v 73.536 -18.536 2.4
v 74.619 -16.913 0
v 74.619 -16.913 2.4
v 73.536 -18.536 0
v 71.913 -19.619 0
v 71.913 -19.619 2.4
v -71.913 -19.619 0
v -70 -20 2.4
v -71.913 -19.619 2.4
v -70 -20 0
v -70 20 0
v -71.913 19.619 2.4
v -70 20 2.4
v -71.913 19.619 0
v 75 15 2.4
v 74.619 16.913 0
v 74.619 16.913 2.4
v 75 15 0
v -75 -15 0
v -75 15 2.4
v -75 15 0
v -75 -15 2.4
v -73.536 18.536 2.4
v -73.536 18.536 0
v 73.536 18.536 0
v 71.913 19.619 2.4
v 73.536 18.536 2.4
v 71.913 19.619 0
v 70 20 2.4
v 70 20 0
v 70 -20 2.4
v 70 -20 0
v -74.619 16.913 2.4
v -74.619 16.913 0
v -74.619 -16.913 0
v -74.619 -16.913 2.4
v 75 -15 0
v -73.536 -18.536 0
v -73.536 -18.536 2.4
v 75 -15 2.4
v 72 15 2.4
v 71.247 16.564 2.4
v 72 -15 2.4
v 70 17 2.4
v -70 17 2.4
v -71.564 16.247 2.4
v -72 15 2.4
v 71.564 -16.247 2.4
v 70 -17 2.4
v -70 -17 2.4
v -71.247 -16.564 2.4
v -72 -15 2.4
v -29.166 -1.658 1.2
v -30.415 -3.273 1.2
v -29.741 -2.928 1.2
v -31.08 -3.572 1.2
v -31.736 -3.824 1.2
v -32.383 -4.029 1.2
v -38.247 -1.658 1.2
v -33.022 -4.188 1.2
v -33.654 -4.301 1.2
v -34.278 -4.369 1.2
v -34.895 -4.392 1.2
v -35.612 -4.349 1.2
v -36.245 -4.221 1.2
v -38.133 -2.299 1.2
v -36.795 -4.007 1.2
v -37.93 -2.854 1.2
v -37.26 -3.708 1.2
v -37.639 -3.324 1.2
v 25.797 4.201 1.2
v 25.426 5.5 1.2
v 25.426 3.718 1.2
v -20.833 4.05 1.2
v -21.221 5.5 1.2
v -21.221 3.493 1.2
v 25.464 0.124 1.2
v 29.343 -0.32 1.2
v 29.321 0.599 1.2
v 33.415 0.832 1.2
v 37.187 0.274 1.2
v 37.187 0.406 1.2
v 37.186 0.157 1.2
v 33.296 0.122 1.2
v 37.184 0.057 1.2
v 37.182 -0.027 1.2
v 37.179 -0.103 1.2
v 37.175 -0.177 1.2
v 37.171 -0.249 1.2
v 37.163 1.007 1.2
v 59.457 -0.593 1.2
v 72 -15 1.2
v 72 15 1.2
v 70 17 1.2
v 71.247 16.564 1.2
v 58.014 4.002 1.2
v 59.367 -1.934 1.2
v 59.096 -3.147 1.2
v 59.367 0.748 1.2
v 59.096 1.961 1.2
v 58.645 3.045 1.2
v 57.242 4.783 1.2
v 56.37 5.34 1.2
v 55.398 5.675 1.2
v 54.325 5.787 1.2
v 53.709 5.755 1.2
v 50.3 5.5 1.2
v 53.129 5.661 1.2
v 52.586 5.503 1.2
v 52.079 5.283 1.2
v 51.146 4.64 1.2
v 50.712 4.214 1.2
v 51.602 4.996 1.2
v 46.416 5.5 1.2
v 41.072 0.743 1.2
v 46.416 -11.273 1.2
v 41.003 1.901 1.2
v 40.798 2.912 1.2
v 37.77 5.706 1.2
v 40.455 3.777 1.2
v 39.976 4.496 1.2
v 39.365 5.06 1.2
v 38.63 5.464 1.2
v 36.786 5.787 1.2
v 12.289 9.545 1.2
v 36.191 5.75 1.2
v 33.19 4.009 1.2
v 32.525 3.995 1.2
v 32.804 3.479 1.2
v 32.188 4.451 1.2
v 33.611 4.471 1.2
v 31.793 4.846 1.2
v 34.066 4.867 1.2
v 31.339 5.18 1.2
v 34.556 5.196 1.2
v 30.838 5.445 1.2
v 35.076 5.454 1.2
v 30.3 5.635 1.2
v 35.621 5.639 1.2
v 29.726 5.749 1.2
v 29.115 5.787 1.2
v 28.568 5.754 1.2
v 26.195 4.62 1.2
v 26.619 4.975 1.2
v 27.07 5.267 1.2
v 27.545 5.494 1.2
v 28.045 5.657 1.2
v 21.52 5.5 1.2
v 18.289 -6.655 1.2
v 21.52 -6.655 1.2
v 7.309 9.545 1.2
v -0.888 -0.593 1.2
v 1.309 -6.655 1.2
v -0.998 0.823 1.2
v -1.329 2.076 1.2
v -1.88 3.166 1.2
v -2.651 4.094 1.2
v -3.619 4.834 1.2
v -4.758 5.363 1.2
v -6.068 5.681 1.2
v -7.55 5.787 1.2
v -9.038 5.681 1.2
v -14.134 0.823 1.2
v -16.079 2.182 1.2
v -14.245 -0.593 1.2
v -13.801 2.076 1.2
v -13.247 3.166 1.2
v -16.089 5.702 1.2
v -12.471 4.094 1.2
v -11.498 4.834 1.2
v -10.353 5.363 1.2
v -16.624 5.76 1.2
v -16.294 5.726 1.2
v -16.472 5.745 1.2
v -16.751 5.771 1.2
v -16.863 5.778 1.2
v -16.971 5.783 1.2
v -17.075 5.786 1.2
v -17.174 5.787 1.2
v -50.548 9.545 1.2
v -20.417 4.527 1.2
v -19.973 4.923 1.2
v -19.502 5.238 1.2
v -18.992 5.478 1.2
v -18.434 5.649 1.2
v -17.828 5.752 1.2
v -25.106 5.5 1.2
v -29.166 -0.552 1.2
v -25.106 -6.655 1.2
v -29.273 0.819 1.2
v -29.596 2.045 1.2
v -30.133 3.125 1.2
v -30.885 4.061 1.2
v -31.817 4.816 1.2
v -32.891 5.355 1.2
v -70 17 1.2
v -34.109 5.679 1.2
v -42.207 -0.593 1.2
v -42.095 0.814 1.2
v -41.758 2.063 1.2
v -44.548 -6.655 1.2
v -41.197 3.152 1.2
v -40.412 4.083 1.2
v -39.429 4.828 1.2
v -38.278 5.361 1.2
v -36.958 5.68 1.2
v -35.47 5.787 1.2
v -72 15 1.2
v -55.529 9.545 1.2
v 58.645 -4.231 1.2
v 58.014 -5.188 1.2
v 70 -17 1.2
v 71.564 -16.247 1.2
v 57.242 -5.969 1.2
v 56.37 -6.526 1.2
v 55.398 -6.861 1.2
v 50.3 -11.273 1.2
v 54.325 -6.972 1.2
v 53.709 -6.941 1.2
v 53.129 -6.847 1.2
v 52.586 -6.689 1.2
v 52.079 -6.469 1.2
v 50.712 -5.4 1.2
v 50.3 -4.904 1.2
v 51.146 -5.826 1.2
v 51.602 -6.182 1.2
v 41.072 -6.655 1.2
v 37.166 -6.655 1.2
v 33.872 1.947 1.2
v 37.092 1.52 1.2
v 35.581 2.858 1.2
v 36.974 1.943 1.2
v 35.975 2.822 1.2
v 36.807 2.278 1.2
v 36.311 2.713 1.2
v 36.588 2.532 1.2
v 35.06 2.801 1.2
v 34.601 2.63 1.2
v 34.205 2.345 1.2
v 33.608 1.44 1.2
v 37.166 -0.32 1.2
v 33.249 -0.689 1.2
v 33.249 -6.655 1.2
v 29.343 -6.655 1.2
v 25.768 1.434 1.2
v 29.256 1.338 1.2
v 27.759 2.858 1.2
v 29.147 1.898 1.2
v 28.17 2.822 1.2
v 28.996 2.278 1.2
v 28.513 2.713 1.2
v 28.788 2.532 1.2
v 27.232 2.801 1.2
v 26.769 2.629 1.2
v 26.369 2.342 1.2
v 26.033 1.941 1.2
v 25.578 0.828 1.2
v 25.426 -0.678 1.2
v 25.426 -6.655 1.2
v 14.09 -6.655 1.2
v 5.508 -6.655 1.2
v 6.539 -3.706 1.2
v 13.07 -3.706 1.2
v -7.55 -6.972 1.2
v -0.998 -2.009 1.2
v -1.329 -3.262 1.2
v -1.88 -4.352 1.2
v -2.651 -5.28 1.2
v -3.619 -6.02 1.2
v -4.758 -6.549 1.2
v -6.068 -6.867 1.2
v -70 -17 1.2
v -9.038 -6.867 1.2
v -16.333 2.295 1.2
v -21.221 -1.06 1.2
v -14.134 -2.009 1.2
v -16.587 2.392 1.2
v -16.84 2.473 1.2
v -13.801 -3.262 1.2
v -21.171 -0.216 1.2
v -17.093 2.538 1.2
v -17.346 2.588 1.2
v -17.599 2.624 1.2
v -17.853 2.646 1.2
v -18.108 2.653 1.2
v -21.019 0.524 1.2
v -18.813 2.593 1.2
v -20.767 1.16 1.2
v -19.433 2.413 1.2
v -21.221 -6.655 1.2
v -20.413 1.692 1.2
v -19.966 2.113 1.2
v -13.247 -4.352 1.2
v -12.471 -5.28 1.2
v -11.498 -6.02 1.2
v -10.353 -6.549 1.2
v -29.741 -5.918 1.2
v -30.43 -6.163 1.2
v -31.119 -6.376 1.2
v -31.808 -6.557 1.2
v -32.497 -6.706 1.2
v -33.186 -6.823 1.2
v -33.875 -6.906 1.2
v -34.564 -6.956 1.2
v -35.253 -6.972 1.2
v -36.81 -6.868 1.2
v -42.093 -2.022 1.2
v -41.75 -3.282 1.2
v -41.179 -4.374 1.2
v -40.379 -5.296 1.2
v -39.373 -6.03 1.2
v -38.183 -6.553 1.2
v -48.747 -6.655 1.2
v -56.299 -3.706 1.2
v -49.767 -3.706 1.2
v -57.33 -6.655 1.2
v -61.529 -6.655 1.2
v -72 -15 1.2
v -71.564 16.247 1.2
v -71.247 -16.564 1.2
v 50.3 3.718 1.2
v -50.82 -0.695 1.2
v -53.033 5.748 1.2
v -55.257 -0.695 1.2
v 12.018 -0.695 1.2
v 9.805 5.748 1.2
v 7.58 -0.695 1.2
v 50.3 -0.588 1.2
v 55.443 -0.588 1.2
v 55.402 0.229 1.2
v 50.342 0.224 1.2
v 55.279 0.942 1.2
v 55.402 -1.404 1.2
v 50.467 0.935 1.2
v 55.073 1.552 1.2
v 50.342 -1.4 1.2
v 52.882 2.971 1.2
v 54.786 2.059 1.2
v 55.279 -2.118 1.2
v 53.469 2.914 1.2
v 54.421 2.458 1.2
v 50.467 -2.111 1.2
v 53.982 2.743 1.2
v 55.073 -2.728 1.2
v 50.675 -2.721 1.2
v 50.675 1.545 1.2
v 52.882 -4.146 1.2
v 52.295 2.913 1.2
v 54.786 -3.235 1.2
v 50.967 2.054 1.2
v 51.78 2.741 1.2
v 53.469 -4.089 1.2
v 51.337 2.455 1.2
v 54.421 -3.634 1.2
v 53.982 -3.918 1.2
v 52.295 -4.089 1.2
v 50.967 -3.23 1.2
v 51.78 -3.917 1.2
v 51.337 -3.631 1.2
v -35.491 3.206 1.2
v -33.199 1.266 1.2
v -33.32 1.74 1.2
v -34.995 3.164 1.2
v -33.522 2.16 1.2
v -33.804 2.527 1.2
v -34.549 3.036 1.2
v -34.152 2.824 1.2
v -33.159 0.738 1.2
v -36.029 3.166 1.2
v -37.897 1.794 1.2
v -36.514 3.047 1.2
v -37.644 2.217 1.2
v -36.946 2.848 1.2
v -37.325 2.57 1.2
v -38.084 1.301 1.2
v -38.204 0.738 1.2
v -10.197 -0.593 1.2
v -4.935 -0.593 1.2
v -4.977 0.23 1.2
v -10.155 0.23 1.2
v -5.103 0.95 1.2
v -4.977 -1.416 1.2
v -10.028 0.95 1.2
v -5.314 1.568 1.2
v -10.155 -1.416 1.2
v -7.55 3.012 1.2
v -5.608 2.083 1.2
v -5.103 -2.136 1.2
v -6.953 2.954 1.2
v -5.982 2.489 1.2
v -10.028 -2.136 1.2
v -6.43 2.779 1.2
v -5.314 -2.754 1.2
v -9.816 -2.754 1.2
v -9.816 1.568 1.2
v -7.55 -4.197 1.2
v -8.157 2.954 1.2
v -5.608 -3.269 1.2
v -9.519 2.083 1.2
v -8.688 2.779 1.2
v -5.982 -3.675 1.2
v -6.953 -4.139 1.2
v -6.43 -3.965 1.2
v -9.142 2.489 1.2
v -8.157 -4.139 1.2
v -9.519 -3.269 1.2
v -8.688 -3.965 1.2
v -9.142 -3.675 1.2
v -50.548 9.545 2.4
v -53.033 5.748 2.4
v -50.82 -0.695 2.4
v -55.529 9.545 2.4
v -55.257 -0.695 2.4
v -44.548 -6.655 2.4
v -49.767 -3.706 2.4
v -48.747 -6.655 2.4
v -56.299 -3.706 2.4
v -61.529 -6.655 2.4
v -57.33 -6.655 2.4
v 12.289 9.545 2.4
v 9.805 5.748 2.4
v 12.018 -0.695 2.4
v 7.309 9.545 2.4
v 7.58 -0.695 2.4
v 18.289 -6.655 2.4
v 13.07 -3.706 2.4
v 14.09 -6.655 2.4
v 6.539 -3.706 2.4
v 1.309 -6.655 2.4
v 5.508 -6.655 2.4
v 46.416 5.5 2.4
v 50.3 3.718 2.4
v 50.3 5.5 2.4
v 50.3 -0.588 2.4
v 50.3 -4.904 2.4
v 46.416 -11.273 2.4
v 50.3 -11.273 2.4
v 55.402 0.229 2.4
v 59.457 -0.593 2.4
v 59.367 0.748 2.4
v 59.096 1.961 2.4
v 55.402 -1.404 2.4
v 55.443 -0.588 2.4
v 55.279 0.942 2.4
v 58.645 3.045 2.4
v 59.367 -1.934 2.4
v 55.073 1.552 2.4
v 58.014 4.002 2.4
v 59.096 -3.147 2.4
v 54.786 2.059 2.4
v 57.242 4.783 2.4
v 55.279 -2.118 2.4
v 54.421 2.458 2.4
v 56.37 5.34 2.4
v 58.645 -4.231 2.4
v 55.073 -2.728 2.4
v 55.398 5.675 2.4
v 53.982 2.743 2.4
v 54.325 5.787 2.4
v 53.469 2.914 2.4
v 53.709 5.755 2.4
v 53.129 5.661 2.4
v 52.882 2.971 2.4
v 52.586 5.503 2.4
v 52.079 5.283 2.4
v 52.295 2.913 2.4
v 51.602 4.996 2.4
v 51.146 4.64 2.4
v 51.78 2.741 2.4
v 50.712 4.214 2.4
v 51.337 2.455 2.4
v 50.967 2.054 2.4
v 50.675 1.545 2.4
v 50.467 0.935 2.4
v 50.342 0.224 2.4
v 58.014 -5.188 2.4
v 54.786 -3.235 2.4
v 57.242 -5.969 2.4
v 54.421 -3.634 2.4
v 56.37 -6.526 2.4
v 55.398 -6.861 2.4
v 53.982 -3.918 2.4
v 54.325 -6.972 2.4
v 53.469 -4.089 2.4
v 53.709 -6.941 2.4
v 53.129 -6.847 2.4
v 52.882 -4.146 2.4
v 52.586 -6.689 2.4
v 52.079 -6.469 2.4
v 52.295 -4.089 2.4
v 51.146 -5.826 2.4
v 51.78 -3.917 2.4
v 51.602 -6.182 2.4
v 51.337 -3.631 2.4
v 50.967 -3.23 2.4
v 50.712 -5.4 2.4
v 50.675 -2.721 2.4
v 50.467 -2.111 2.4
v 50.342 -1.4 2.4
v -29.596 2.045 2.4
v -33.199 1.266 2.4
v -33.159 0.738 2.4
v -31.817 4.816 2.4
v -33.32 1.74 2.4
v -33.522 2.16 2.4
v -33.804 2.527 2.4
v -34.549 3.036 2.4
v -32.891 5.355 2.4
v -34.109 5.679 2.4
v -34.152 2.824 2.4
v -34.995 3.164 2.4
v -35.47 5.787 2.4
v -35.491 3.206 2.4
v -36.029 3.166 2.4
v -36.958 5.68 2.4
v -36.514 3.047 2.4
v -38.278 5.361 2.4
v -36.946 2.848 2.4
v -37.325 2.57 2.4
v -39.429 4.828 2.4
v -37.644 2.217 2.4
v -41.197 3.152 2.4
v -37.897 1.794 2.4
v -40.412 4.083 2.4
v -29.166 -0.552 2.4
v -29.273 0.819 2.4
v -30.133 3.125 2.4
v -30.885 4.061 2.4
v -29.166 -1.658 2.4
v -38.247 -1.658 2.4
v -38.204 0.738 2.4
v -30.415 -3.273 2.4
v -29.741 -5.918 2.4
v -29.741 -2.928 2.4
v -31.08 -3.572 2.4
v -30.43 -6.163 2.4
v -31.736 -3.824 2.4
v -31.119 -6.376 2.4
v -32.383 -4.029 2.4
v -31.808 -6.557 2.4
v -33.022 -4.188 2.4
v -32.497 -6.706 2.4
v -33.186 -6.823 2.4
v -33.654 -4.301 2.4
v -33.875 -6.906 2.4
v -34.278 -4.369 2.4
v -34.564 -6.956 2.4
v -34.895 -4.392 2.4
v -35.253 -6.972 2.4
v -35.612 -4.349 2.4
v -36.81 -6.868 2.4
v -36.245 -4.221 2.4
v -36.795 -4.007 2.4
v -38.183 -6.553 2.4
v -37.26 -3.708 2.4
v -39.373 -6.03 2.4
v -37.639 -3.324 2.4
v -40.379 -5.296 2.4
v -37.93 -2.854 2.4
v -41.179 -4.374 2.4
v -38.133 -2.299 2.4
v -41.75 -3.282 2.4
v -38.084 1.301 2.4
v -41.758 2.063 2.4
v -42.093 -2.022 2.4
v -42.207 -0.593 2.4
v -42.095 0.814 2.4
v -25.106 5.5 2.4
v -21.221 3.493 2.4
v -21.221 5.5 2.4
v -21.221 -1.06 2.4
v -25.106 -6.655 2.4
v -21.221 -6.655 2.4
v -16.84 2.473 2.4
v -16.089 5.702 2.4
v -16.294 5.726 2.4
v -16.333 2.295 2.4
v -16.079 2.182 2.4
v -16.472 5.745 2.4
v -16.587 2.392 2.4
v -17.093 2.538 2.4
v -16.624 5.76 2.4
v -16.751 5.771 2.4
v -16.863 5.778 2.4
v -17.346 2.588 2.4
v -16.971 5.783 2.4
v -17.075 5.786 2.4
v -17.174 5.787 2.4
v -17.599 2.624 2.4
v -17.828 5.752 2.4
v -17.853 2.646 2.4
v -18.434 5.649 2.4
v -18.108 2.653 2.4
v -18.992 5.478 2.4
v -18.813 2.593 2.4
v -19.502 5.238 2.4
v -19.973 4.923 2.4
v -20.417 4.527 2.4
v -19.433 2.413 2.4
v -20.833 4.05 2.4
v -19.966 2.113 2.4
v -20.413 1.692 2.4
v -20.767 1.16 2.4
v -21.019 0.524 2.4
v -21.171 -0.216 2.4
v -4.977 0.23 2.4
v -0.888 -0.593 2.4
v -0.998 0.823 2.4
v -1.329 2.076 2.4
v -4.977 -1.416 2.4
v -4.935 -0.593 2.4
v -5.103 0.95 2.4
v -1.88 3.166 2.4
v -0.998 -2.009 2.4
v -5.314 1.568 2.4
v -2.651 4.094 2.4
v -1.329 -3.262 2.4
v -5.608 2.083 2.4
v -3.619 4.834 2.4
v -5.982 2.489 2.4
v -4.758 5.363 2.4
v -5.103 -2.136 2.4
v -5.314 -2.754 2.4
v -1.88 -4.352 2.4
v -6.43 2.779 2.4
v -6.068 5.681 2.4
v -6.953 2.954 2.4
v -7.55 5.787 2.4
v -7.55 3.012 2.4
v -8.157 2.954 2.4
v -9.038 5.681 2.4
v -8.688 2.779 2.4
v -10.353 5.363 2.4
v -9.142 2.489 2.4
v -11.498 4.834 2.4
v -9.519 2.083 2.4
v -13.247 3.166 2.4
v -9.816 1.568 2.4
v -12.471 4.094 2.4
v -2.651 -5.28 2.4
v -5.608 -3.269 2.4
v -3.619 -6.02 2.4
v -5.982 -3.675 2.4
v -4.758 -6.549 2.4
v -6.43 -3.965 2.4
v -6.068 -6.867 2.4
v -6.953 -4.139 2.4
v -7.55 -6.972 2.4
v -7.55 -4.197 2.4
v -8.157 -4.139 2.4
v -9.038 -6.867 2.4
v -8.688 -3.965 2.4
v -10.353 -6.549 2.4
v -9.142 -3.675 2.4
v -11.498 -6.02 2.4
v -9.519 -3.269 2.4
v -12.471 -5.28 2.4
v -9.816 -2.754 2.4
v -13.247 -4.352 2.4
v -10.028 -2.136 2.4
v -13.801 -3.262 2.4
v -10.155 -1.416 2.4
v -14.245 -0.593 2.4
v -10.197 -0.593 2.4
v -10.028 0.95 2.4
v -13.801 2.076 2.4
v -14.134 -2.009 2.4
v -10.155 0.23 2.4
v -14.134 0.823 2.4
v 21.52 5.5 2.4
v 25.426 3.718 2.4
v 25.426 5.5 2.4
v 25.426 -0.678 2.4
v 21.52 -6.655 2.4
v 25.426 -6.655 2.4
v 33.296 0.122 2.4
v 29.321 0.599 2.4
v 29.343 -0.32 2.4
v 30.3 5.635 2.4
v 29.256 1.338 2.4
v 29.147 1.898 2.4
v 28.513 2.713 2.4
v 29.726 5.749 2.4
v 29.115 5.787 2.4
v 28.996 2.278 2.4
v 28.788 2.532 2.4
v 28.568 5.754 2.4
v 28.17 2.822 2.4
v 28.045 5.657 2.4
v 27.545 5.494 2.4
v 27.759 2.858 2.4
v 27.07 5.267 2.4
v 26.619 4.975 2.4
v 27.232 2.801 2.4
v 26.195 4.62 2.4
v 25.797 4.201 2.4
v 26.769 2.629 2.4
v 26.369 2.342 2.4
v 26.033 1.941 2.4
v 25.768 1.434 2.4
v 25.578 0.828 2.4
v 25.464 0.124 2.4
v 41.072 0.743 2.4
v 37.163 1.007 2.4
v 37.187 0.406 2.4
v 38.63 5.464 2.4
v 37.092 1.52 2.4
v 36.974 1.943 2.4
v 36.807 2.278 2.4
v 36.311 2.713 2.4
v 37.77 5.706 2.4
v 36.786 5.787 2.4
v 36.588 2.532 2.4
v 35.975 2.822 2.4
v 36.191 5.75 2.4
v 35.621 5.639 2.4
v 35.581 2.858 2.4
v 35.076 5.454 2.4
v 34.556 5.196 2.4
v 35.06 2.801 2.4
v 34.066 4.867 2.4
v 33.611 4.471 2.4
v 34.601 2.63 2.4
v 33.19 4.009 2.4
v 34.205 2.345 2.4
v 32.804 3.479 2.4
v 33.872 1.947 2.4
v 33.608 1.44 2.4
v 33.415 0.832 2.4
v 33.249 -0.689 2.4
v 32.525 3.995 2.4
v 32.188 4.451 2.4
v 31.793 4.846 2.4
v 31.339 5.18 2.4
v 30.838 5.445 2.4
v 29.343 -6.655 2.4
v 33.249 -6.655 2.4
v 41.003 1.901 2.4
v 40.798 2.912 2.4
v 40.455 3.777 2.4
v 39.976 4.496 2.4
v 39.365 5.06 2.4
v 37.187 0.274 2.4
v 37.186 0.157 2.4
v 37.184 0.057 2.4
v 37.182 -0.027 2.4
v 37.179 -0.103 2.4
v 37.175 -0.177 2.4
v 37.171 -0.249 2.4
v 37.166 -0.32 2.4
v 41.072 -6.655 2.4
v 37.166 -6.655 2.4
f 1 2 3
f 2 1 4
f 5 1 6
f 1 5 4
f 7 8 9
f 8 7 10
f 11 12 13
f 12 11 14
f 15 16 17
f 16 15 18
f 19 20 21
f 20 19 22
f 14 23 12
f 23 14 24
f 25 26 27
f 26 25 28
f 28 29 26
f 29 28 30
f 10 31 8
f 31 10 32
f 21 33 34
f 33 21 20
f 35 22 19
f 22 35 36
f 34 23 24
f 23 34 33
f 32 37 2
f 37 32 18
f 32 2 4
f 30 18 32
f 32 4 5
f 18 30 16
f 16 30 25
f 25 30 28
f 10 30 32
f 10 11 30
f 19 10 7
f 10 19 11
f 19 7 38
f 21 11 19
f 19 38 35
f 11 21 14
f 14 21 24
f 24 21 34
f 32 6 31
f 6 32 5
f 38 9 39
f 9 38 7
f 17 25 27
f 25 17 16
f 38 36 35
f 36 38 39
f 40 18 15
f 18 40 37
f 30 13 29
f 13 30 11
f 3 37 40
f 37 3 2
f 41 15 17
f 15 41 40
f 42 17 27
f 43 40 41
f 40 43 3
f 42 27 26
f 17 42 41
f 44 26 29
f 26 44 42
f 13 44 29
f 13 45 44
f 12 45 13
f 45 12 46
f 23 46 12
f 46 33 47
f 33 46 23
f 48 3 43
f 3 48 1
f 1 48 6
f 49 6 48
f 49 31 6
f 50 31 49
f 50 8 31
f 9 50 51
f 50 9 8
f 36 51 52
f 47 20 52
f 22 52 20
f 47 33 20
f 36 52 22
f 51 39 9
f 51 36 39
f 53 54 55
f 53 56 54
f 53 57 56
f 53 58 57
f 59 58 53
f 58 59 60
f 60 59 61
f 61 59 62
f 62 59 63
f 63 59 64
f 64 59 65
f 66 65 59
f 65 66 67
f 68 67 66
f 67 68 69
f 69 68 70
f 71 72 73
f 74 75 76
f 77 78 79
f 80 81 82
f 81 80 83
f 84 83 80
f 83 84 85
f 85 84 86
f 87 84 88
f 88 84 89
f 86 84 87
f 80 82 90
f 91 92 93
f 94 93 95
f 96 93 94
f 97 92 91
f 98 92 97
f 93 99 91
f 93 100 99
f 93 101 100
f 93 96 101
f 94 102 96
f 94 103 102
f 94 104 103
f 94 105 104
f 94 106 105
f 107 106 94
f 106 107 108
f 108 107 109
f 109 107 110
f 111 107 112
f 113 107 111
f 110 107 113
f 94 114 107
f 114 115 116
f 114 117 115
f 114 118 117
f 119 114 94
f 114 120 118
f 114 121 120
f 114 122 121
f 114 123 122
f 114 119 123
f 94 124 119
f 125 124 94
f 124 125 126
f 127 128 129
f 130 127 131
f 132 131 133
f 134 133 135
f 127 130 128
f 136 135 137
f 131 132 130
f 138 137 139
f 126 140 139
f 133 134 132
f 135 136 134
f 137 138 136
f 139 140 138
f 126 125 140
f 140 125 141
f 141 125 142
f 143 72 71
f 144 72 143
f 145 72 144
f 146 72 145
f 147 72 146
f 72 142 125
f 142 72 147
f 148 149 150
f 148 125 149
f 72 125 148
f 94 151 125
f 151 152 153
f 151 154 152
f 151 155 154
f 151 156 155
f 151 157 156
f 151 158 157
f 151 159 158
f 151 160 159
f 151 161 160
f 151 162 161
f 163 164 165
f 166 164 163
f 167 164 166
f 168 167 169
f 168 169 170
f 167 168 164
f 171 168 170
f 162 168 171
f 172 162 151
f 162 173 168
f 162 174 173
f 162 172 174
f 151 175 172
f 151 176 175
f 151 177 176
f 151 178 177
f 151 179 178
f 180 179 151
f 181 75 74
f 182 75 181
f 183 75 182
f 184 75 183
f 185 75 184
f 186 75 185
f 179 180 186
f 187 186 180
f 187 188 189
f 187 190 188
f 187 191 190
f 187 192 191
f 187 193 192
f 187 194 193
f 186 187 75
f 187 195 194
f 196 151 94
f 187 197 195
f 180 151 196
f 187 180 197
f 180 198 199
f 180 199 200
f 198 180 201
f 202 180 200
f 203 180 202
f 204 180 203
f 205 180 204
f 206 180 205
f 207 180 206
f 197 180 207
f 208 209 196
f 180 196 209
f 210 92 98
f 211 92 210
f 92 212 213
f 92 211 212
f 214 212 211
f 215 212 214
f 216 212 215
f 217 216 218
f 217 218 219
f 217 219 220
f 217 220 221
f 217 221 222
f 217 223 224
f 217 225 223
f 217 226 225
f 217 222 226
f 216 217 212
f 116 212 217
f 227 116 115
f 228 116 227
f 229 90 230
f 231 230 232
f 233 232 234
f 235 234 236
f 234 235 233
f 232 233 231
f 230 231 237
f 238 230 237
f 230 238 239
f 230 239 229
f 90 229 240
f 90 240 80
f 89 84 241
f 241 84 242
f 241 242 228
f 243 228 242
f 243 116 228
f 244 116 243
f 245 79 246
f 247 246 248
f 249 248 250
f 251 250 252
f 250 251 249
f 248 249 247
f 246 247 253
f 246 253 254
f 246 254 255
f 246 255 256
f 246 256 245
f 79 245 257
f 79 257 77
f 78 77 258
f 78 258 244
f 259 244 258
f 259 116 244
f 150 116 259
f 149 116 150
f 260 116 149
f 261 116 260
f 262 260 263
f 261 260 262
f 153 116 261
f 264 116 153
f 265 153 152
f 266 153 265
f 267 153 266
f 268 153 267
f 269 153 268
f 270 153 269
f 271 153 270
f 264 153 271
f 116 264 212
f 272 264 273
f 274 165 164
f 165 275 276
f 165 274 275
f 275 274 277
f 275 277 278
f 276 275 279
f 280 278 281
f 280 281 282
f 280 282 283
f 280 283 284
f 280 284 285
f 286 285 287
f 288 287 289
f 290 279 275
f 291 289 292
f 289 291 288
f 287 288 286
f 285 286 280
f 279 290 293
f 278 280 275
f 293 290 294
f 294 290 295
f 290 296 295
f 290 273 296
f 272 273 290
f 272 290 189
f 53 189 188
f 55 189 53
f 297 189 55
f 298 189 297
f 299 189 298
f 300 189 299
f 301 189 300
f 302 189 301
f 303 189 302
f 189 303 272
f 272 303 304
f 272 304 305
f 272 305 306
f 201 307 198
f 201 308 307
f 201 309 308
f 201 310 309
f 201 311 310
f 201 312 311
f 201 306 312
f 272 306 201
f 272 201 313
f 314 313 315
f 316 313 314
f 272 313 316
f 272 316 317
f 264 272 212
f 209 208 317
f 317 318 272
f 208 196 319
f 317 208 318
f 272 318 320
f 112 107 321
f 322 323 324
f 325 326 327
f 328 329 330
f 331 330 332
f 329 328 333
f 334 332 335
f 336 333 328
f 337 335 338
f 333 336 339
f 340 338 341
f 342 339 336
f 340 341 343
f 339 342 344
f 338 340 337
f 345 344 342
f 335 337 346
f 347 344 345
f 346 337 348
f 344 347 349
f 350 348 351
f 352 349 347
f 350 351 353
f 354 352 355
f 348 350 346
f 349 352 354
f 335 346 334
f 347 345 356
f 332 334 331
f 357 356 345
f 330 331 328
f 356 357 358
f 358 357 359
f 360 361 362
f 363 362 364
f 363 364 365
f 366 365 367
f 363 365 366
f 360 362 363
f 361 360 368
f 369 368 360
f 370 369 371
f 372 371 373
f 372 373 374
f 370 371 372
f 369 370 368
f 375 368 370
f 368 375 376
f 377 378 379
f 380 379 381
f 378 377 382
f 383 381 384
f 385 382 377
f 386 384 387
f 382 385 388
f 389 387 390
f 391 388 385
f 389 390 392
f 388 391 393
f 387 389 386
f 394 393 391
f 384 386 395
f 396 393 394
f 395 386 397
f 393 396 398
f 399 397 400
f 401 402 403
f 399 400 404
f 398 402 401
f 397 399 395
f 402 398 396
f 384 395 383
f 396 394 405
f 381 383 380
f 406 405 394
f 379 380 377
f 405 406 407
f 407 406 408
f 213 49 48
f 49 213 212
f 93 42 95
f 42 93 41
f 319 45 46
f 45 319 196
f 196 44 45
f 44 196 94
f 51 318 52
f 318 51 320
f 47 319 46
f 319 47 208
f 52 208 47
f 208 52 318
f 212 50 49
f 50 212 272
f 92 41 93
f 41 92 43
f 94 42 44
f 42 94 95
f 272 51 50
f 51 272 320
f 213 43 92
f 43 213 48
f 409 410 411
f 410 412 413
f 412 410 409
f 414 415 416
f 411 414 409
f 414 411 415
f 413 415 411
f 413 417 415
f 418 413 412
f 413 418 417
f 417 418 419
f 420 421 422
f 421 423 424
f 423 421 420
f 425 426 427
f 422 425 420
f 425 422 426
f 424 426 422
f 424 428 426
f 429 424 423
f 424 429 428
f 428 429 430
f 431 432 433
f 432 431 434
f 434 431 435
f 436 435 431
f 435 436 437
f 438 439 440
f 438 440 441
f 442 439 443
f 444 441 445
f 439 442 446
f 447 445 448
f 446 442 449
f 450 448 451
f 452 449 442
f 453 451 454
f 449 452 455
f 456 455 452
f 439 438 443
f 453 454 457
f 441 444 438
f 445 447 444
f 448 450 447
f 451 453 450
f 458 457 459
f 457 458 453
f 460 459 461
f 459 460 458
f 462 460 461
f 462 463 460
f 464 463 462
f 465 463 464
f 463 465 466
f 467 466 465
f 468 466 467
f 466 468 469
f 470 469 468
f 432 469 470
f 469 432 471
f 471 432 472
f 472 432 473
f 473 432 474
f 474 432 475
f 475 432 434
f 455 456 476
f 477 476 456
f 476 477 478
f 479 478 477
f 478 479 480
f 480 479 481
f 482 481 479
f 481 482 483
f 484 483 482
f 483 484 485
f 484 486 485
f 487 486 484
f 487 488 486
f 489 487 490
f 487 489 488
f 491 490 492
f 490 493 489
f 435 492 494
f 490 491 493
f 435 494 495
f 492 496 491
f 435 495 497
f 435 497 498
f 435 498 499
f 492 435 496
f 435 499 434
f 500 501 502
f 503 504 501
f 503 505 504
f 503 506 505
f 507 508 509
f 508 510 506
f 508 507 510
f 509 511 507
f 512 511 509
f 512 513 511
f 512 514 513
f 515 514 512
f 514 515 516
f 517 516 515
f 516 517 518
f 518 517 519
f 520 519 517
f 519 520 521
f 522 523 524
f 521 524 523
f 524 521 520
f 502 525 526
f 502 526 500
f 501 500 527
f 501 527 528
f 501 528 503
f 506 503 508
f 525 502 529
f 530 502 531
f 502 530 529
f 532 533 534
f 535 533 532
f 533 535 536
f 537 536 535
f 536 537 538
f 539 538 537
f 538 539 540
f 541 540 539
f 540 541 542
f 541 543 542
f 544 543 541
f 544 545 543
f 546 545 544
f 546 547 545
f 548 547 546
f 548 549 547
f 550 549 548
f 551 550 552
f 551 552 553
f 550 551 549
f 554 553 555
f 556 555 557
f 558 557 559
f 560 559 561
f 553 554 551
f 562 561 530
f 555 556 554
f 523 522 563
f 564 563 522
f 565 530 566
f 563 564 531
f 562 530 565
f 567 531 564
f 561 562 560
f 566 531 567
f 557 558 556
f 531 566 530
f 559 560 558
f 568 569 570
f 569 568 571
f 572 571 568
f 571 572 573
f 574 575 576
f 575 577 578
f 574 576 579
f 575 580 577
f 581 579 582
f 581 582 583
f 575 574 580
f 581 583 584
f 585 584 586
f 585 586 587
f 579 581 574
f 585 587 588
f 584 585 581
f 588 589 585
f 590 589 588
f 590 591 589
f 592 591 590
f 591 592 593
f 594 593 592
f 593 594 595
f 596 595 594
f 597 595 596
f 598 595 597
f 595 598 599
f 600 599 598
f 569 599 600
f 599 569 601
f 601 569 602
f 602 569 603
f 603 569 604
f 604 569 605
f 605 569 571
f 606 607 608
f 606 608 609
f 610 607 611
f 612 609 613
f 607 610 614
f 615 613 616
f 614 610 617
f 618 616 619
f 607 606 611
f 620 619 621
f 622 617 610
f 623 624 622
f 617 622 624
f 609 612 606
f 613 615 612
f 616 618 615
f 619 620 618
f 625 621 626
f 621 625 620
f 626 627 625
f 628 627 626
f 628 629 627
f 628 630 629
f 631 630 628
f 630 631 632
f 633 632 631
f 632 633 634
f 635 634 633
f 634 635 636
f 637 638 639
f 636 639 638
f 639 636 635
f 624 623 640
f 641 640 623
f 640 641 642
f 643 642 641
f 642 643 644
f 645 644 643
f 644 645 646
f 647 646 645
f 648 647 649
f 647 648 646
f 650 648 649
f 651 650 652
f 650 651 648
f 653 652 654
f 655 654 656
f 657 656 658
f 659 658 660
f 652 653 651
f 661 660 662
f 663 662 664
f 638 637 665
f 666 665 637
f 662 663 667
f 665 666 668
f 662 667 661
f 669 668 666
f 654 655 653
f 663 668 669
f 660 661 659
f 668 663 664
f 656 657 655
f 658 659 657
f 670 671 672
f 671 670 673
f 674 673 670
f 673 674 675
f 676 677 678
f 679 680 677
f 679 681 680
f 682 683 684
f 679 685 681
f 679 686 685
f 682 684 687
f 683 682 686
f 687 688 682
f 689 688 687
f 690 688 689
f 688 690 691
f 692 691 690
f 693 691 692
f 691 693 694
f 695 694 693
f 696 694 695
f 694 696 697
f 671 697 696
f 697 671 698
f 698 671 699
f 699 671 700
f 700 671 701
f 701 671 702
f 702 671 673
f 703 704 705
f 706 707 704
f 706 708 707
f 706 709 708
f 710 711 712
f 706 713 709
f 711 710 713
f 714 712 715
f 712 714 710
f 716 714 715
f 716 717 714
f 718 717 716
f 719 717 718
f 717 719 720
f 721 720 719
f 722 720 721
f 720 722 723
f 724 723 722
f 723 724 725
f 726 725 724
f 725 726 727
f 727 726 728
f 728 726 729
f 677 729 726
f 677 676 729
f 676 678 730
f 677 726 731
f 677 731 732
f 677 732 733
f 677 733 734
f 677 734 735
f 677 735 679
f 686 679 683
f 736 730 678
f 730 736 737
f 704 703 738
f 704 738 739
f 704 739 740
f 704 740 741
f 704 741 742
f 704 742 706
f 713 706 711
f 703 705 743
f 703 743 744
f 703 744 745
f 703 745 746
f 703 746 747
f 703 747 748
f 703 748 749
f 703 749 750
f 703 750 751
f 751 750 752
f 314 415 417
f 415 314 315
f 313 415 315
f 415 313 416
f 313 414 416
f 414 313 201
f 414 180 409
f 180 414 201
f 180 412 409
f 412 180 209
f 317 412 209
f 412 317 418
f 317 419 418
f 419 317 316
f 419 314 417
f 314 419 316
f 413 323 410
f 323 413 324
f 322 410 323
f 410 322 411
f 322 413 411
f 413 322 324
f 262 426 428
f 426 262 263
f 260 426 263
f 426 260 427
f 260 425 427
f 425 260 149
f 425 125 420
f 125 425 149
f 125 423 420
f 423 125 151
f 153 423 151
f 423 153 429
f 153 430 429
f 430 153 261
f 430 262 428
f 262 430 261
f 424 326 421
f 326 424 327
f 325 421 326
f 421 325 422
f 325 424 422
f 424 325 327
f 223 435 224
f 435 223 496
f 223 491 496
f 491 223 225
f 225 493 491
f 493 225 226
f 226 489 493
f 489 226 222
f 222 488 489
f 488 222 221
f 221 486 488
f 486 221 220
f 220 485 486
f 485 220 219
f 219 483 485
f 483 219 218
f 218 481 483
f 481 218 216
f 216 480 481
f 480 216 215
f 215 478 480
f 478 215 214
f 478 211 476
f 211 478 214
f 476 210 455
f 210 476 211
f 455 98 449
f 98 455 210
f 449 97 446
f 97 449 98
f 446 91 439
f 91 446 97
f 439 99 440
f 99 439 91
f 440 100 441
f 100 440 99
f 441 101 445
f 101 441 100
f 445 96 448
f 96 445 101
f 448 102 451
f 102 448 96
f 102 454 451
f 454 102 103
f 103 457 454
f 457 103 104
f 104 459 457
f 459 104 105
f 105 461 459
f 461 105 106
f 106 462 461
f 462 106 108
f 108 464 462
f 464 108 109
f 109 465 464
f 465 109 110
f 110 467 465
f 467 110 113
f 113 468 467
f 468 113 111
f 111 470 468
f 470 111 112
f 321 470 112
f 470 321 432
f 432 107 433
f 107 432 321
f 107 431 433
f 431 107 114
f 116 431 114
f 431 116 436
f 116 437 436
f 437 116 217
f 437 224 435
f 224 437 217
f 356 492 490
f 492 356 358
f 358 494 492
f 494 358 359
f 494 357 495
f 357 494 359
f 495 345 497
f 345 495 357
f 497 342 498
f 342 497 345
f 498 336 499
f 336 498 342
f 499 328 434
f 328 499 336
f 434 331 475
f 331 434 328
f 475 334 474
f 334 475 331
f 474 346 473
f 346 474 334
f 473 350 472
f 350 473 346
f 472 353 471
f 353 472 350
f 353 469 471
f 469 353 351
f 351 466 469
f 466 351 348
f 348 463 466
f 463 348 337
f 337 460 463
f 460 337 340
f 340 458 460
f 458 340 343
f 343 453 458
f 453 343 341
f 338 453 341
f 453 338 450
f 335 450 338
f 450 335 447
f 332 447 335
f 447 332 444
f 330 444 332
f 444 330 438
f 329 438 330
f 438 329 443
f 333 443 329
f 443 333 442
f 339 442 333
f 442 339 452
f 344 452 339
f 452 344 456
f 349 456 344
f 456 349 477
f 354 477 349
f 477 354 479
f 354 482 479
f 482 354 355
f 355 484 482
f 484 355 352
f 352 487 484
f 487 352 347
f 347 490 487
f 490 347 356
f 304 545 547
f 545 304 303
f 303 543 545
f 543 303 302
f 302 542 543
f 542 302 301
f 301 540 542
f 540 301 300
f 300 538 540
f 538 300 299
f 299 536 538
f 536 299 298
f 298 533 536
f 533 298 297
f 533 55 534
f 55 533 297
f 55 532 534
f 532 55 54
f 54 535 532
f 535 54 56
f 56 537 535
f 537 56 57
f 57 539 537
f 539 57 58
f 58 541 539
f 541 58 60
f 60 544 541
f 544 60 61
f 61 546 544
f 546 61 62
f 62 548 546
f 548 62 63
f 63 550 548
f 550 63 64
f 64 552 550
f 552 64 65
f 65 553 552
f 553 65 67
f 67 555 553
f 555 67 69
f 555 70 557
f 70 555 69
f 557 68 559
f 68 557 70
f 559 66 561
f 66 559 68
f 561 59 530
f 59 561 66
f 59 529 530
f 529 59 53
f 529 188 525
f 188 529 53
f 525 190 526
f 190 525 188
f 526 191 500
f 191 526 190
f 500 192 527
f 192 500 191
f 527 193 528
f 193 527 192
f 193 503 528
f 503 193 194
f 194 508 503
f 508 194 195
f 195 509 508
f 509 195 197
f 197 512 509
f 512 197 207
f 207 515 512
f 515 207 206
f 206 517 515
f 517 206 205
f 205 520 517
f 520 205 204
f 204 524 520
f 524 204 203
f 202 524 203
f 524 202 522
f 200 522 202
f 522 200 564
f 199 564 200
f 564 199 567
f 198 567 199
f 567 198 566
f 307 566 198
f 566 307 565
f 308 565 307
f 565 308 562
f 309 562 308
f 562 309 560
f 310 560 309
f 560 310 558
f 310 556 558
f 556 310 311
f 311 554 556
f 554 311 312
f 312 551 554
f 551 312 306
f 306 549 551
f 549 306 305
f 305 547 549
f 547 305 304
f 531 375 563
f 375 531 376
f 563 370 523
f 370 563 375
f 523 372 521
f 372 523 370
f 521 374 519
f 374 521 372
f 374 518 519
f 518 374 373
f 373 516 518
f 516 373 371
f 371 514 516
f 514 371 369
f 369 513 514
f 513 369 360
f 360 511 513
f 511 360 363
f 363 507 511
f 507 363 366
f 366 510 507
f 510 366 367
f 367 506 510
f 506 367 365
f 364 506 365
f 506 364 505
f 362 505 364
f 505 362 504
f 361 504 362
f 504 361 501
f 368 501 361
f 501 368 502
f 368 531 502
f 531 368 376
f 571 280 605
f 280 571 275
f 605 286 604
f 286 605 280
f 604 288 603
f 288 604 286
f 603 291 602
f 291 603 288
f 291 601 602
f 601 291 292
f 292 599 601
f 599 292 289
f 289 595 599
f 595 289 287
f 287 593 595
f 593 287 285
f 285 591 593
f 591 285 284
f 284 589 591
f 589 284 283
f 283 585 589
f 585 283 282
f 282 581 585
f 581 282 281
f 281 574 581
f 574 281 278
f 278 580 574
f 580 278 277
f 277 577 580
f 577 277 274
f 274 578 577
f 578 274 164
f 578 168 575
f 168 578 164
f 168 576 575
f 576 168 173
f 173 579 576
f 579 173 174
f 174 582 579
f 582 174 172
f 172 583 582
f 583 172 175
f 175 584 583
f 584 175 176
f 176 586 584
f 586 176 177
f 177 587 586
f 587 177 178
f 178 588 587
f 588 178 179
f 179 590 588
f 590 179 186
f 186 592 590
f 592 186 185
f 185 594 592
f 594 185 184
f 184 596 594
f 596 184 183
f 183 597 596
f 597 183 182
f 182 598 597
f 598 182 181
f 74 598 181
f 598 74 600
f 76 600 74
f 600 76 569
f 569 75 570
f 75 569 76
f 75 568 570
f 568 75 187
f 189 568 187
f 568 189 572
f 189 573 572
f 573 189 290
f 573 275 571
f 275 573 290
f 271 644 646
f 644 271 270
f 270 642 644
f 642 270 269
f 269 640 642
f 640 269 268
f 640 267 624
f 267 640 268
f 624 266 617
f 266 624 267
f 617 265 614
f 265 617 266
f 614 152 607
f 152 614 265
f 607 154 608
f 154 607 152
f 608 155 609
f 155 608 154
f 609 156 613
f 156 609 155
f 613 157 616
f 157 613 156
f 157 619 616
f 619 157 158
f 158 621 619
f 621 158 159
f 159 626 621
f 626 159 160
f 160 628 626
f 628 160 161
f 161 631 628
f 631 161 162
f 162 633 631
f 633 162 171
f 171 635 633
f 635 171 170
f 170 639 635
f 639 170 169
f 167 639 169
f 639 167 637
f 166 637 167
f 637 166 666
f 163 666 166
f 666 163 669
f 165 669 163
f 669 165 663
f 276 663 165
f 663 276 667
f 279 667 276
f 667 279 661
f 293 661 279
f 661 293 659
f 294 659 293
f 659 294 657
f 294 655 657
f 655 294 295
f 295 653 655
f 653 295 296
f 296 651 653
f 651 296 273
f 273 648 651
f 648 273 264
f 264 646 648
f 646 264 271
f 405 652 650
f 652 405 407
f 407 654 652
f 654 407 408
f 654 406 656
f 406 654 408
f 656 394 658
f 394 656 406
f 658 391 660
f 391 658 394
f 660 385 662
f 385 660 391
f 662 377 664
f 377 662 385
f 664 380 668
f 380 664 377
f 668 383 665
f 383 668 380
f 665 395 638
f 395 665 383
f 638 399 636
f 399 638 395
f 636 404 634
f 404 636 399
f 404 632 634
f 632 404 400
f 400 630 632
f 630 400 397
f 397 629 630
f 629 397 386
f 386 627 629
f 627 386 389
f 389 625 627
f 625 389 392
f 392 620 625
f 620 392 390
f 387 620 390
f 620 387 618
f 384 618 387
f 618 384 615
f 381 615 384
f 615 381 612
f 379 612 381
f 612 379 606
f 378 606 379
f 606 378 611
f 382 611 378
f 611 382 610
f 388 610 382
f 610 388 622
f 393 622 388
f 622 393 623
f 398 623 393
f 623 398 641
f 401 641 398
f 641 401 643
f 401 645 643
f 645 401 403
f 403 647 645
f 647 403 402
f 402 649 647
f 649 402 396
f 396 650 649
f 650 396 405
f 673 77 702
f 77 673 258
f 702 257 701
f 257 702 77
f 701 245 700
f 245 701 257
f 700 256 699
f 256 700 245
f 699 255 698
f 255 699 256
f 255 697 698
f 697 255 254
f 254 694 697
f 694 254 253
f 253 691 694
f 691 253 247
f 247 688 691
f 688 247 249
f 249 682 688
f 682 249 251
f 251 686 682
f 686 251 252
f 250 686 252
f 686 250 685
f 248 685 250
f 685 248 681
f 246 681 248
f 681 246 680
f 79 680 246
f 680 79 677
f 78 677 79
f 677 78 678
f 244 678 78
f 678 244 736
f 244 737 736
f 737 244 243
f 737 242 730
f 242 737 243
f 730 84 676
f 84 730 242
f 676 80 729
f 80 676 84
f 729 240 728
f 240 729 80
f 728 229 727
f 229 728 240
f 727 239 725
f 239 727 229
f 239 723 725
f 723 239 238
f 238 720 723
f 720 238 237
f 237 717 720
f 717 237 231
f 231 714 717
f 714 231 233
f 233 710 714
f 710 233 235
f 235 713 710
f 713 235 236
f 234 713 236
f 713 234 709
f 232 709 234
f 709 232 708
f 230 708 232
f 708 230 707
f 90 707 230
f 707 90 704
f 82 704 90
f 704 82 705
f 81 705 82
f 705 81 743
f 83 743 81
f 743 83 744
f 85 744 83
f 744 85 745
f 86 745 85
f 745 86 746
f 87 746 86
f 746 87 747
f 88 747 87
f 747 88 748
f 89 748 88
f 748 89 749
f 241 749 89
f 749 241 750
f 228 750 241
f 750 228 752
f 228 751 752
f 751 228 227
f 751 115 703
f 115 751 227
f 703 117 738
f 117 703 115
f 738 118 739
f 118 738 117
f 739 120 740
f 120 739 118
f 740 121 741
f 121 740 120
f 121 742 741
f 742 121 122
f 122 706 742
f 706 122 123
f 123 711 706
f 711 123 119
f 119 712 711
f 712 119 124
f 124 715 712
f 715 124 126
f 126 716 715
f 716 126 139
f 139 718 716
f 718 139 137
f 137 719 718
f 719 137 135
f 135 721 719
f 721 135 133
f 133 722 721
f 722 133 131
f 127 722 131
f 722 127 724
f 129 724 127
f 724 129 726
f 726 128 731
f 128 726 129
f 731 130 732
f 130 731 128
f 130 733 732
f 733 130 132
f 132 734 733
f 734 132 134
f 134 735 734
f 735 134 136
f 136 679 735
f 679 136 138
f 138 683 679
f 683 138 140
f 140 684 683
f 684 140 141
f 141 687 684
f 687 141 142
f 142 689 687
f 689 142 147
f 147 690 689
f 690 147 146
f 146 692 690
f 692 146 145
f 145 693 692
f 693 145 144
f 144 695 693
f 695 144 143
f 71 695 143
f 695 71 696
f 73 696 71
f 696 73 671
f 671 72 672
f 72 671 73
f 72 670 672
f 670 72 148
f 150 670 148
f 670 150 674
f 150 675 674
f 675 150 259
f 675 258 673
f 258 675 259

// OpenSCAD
//======================================================================
// Logo.scad
//
// AeroAmp logo for the calorimeter stand
//
// Tom Flint, 29 Aug 2022
//======================================================================


//----------------------------------------------------------------------
module logo1(){

  difference(){
    translate([0,0,0])
    linear_extrude(height=2.4,scale=1)
    offset(r=5)
    square([150-10,40-10],center=true);

    translate([0,0,1.2])
    linear_extrude(height=1.3,scale=1)
    offset(r=2)
    square([150-10,40-10],center=true);
  }
  
  translate([0,-1,1.2])
  linear_extrude(height=1.2,scale=1)
  text("AeroAmp", font = "Open Sans:style=Bold", size=16,halign="center",valign="center",spacing=1.1);

}

//======================================================================

logo1();

//======================================================================
